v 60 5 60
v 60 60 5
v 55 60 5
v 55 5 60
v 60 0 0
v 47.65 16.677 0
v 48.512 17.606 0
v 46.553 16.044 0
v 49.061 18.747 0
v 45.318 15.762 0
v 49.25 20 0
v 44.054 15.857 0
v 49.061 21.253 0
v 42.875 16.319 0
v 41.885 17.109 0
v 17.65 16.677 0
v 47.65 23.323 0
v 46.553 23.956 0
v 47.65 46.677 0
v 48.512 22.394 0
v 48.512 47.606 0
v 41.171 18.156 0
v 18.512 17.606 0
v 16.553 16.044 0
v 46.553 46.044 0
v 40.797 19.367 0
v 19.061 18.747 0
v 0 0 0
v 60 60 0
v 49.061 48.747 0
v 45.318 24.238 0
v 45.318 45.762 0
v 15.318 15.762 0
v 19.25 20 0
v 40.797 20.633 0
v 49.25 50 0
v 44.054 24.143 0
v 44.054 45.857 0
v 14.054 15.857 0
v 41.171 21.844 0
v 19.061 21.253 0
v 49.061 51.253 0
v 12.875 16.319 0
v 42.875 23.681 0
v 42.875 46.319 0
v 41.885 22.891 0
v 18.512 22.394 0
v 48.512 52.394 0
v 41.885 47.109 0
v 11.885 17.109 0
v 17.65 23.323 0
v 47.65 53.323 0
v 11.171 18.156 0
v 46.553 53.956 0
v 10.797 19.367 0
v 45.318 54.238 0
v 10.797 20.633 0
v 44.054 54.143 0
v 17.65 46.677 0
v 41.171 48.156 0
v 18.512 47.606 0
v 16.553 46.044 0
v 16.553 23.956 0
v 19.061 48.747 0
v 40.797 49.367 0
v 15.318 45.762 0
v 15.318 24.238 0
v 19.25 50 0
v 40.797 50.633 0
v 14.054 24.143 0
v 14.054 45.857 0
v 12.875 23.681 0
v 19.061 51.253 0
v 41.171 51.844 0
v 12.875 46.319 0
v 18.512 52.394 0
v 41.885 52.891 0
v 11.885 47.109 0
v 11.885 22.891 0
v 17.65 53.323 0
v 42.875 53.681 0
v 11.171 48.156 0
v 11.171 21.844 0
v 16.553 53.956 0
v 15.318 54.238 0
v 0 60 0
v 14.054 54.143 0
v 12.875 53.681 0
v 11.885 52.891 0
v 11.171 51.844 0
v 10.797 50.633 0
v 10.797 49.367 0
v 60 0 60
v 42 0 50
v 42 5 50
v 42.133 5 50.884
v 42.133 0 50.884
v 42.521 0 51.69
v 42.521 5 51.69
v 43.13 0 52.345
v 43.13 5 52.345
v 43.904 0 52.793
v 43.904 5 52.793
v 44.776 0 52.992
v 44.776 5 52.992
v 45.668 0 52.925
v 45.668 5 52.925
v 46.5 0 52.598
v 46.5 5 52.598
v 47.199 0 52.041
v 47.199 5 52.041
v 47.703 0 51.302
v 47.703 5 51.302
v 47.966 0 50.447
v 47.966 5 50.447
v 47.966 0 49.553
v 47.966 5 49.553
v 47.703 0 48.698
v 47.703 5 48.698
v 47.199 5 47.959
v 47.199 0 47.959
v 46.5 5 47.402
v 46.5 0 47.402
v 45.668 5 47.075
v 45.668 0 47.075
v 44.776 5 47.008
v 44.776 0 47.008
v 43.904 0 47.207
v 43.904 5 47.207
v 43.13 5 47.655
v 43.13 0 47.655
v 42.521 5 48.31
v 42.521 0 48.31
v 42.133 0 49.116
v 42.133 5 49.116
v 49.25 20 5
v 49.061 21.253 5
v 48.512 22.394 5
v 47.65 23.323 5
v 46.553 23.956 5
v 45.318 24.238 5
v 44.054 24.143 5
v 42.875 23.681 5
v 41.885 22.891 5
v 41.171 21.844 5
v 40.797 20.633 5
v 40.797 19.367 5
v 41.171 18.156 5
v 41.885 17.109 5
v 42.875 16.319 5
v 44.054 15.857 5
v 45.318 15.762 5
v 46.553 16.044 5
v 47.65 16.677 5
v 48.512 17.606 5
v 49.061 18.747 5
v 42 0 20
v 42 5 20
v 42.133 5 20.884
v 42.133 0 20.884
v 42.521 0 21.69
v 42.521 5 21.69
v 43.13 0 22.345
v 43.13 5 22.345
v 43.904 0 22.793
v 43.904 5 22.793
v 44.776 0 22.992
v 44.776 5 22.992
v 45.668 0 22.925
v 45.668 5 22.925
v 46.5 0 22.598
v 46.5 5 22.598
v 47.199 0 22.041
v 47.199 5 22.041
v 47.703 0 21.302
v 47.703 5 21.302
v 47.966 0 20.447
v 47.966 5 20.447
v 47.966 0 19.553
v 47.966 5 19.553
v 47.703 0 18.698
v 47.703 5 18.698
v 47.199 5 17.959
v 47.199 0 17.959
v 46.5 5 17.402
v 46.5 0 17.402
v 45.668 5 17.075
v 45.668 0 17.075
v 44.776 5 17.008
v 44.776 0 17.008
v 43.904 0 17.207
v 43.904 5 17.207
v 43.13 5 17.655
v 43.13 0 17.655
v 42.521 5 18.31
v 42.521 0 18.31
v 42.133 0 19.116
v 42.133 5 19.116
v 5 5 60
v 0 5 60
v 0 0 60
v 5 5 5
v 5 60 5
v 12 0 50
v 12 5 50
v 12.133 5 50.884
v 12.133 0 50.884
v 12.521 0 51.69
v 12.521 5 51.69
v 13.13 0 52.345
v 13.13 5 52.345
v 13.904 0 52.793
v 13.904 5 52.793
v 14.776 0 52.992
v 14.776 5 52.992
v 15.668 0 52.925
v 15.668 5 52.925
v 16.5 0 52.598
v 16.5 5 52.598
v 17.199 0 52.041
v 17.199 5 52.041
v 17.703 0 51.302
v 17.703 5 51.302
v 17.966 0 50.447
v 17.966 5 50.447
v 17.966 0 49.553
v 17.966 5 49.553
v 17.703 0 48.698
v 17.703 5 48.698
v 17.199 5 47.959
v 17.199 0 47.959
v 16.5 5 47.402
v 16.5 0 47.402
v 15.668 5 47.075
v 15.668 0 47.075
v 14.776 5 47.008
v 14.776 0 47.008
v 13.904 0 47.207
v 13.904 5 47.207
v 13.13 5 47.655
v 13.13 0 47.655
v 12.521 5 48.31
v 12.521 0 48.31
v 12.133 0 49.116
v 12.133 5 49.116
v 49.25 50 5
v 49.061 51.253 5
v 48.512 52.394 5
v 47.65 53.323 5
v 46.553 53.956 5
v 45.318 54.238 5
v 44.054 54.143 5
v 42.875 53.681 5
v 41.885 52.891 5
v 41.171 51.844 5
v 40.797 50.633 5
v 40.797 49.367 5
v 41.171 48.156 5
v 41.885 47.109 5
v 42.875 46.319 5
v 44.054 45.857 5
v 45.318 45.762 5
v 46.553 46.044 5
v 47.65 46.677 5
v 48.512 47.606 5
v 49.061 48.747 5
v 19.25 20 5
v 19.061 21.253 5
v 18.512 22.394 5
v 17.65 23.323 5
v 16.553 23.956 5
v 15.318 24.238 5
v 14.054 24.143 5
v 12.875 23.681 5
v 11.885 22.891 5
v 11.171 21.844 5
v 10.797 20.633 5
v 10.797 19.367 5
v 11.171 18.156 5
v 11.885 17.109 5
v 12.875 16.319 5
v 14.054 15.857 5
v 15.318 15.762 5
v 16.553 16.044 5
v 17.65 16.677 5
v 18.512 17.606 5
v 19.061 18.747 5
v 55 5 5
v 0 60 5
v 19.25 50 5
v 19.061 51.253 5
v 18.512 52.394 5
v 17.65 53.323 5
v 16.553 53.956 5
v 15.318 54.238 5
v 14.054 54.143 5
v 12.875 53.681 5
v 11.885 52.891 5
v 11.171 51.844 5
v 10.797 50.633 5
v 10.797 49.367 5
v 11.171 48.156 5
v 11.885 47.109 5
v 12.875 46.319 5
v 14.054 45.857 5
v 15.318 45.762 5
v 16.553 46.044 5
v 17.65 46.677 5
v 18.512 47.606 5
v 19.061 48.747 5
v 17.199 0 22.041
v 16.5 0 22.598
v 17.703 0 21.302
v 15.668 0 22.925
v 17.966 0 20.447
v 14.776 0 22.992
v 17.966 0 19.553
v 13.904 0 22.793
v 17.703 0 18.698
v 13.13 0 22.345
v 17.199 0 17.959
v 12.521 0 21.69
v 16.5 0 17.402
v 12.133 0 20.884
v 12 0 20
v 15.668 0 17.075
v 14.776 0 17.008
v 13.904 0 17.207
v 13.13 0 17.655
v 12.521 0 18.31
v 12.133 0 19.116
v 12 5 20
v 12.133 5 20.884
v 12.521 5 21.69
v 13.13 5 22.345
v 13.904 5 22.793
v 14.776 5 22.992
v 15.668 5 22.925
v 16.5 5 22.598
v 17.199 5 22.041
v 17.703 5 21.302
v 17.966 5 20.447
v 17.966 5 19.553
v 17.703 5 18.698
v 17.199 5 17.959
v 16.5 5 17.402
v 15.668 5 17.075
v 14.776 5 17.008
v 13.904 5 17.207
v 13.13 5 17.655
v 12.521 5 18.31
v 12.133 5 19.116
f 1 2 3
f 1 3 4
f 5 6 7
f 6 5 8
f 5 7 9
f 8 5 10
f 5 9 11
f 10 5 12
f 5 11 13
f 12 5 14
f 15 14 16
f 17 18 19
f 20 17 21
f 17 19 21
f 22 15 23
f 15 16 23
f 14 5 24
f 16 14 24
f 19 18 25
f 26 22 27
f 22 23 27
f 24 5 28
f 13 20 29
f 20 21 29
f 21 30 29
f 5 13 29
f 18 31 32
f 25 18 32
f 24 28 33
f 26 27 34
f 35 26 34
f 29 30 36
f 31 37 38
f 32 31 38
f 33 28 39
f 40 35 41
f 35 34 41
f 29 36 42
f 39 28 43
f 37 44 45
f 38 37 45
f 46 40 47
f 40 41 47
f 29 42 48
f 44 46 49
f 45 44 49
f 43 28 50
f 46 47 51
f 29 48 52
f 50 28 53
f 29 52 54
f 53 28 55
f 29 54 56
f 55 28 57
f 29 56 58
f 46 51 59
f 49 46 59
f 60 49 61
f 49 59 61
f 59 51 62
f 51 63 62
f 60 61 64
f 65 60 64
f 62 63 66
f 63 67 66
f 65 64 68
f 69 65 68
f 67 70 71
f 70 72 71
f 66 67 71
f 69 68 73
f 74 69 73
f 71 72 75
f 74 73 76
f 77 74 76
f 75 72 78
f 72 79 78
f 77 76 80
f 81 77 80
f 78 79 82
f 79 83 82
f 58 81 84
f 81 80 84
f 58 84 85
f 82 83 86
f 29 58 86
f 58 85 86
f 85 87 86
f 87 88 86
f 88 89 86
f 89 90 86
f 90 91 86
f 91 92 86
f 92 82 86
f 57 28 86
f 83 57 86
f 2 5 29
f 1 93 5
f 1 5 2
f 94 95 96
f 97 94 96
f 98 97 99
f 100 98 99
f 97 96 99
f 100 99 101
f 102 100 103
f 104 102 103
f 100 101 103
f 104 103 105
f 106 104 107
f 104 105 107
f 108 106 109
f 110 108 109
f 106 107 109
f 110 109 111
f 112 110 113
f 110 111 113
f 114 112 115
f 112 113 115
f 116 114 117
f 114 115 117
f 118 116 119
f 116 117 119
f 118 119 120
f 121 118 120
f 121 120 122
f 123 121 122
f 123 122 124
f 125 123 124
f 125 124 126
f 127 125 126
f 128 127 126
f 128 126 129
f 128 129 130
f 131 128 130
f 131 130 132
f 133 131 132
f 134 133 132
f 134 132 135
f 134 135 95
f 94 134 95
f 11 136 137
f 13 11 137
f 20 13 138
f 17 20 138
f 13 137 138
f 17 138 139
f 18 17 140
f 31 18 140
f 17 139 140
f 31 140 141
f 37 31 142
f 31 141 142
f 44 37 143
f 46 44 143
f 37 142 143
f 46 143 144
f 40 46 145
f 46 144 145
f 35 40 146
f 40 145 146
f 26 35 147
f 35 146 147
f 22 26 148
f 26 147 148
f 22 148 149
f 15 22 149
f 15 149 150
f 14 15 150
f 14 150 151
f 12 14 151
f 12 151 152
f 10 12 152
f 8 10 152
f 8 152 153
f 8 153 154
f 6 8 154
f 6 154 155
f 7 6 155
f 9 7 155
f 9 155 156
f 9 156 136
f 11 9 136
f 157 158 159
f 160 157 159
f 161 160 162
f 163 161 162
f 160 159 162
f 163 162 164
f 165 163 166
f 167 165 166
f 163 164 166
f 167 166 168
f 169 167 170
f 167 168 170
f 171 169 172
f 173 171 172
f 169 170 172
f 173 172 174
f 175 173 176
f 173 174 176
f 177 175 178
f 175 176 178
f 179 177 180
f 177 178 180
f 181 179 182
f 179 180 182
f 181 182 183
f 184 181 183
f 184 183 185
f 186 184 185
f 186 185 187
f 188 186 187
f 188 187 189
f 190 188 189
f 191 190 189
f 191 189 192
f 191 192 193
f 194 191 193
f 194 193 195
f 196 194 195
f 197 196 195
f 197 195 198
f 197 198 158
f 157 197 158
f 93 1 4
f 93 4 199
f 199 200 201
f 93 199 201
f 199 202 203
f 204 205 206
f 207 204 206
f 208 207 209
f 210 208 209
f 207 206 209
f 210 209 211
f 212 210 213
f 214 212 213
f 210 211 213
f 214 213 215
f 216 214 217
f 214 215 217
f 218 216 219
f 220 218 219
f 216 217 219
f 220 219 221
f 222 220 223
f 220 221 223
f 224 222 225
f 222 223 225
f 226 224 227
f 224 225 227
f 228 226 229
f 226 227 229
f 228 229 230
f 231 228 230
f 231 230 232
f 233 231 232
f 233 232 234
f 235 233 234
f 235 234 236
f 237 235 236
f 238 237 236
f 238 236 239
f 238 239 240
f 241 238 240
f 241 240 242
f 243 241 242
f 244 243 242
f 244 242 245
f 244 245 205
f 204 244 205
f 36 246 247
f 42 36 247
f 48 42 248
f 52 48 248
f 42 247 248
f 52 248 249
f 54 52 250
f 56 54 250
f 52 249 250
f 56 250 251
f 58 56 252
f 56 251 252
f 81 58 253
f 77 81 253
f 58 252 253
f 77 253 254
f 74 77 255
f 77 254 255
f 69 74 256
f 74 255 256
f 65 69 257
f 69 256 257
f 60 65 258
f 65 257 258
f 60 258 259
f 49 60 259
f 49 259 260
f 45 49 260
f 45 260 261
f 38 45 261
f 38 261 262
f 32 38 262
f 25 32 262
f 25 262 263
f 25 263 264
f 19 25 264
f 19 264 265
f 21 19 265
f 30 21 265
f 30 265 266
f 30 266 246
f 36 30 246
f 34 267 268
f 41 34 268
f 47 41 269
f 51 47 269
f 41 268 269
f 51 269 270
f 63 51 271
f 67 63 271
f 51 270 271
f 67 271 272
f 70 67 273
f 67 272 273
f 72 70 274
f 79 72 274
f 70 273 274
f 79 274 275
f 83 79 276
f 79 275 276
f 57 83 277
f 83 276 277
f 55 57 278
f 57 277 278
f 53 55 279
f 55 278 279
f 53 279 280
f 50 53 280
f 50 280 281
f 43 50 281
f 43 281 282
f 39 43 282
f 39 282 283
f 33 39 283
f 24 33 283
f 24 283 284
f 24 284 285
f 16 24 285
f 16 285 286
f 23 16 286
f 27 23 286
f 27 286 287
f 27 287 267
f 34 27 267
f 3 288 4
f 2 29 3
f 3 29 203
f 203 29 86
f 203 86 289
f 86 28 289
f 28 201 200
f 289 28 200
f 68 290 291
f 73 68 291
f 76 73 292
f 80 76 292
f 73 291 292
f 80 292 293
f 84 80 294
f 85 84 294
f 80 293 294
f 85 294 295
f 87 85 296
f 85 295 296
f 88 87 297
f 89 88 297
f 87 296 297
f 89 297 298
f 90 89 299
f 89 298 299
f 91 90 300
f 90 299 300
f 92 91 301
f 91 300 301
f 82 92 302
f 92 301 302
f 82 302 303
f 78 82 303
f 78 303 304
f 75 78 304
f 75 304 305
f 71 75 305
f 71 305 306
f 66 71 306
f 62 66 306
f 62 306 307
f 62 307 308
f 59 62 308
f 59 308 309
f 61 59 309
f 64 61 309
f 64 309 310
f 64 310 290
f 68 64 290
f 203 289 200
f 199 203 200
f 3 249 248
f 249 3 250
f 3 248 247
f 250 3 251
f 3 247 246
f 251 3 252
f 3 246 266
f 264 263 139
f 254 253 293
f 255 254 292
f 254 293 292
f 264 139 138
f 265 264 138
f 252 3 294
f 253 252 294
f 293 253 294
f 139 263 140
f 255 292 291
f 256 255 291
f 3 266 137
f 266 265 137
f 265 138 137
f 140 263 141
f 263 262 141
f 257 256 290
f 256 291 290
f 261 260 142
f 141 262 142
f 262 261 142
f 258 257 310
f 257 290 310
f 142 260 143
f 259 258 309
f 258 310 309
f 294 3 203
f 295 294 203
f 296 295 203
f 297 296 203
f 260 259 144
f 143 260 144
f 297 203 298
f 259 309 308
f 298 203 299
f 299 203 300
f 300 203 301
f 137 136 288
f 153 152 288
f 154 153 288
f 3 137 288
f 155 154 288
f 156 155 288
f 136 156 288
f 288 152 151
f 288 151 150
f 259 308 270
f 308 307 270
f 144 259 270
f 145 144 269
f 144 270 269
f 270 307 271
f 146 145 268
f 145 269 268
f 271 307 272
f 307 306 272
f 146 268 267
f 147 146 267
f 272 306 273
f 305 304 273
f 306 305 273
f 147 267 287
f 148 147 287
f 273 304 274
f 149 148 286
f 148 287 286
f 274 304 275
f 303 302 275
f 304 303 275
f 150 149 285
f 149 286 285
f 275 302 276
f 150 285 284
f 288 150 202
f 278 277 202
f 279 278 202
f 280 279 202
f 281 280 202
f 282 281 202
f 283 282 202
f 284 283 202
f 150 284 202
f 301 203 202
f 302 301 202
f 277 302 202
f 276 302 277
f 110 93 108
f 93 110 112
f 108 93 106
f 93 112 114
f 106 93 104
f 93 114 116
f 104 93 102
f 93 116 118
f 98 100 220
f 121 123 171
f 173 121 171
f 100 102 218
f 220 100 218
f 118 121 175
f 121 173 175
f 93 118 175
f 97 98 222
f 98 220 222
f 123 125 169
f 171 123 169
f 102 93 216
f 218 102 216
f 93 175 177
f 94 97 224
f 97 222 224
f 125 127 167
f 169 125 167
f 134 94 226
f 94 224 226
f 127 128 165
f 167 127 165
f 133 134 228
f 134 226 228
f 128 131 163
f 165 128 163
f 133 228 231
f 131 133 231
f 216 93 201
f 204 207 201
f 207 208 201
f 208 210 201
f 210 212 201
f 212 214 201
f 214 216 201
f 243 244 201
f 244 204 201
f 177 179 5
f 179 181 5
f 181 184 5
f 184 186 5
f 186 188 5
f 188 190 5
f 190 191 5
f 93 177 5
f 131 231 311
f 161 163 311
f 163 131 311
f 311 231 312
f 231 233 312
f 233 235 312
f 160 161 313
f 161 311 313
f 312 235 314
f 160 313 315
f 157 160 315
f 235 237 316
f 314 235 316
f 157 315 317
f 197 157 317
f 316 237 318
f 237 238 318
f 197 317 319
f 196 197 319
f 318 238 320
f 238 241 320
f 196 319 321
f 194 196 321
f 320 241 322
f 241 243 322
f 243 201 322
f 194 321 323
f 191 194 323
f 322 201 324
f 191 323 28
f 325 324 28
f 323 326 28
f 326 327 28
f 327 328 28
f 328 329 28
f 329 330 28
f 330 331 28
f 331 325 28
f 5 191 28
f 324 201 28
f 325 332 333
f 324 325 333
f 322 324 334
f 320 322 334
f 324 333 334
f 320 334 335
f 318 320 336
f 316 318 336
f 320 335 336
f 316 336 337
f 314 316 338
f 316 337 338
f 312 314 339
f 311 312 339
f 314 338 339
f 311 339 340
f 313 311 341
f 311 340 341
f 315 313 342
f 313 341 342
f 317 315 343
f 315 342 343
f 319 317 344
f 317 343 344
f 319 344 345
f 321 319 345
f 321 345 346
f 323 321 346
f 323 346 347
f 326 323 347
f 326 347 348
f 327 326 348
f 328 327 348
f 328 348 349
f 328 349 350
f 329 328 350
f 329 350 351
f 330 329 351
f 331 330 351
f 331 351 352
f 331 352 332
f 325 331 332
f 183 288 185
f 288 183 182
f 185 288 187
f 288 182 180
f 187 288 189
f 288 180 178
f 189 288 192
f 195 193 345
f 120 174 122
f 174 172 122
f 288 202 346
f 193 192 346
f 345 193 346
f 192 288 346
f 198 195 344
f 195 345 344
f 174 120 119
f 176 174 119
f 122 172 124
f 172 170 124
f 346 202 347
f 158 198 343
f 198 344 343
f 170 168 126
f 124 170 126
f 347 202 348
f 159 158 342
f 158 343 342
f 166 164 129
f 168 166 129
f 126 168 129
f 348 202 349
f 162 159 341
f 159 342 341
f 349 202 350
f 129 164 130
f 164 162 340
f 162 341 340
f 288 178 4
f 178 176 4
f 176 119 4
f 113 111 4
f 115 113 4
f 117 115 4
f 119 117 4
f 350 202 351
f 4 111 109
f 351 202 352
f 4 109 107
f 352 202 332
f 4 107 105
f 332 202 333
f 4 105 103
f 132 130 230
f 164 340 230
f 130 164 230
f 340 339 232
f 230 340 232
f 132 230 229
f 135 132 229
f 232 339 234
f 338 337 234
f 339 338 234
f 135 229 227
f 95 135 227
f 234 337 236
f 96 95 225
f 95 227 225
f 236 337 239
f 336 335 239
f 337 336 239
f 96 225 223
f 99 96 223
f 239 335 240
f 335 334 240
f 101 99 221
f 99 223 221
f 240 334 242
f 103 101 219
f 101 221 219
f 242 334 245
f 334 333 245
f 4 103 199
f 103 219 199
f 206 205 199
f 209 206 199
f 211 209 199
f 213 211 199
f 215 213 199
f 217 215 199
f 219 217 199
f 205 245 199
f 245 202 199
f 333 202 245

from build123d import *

# Parameters (mm, degrees)
F1_DEPTH  = 60
F3_DEPTH  = 5
F6_DEPTH  = 5
F7_R      = 3
F8_DEPTH  = 5.001
F9_R      = 4.25
F10_DEPTH = 5.001


with BuildPart() as f1:
    # F0 (on Right) → F1 (new body)
    with BuildSketch(Plane.YZ):
        Polygon((5, 60), (0, 60), (0, 0), (60, 0), (60, 5), (5, 5), align=None)
    extrude(amount=F1_DEPTH)

    # F2 (on Right) → F3 (join)
    with BuildSketch(Plane.YZ):
        Polygon((60, 5), (5, 60), (5, 5), align=None)
    extrude(amount=F3_DEPTH)

    # F5 (on offset) → F6 (join)
    with BuildSketch(Plane.YZ.offset(60)):
        Polygon((60, 5), (5, 60), (5, 5), align=None)
    extrude(amount=-F6_DEPTH)

    # F7 (on face) → F8 (cut, through all)
    with BuildSketch(Plane(origin=(0, 5, 0), x_dir=(-1, 0, 0), z_dir=(0, 1, 0))):
        with Locations((-15, 50)):
            Circle(F7_R)
        with Locations((-45, 50)):
            Circle(F7_R)
        with Locations((-15, 20)):
            Circle(F7_R)
        with Locations((-45, 20)):
            Circle(F7_R)
    extrude(amount=-F8_DEPTH, mode=Mode.SUBTRACT)

    # F9 (on face) → F10 (cut, through all)
    with BuildSketch(Plane.XY.offset(5)):
        with Locations((45, 50)):
            Circle(F9_R)
        with Locations((15, 50)):
            Circle(F9_R)
        with Locations((15, 20)):
            Circle(F9_R)
        with Locations((45, 20)):
            Circle(F9_R)
    extrude(amount=-F10_DEPTH, mode=Mode.SUBTRACT)


solid = f1.part
